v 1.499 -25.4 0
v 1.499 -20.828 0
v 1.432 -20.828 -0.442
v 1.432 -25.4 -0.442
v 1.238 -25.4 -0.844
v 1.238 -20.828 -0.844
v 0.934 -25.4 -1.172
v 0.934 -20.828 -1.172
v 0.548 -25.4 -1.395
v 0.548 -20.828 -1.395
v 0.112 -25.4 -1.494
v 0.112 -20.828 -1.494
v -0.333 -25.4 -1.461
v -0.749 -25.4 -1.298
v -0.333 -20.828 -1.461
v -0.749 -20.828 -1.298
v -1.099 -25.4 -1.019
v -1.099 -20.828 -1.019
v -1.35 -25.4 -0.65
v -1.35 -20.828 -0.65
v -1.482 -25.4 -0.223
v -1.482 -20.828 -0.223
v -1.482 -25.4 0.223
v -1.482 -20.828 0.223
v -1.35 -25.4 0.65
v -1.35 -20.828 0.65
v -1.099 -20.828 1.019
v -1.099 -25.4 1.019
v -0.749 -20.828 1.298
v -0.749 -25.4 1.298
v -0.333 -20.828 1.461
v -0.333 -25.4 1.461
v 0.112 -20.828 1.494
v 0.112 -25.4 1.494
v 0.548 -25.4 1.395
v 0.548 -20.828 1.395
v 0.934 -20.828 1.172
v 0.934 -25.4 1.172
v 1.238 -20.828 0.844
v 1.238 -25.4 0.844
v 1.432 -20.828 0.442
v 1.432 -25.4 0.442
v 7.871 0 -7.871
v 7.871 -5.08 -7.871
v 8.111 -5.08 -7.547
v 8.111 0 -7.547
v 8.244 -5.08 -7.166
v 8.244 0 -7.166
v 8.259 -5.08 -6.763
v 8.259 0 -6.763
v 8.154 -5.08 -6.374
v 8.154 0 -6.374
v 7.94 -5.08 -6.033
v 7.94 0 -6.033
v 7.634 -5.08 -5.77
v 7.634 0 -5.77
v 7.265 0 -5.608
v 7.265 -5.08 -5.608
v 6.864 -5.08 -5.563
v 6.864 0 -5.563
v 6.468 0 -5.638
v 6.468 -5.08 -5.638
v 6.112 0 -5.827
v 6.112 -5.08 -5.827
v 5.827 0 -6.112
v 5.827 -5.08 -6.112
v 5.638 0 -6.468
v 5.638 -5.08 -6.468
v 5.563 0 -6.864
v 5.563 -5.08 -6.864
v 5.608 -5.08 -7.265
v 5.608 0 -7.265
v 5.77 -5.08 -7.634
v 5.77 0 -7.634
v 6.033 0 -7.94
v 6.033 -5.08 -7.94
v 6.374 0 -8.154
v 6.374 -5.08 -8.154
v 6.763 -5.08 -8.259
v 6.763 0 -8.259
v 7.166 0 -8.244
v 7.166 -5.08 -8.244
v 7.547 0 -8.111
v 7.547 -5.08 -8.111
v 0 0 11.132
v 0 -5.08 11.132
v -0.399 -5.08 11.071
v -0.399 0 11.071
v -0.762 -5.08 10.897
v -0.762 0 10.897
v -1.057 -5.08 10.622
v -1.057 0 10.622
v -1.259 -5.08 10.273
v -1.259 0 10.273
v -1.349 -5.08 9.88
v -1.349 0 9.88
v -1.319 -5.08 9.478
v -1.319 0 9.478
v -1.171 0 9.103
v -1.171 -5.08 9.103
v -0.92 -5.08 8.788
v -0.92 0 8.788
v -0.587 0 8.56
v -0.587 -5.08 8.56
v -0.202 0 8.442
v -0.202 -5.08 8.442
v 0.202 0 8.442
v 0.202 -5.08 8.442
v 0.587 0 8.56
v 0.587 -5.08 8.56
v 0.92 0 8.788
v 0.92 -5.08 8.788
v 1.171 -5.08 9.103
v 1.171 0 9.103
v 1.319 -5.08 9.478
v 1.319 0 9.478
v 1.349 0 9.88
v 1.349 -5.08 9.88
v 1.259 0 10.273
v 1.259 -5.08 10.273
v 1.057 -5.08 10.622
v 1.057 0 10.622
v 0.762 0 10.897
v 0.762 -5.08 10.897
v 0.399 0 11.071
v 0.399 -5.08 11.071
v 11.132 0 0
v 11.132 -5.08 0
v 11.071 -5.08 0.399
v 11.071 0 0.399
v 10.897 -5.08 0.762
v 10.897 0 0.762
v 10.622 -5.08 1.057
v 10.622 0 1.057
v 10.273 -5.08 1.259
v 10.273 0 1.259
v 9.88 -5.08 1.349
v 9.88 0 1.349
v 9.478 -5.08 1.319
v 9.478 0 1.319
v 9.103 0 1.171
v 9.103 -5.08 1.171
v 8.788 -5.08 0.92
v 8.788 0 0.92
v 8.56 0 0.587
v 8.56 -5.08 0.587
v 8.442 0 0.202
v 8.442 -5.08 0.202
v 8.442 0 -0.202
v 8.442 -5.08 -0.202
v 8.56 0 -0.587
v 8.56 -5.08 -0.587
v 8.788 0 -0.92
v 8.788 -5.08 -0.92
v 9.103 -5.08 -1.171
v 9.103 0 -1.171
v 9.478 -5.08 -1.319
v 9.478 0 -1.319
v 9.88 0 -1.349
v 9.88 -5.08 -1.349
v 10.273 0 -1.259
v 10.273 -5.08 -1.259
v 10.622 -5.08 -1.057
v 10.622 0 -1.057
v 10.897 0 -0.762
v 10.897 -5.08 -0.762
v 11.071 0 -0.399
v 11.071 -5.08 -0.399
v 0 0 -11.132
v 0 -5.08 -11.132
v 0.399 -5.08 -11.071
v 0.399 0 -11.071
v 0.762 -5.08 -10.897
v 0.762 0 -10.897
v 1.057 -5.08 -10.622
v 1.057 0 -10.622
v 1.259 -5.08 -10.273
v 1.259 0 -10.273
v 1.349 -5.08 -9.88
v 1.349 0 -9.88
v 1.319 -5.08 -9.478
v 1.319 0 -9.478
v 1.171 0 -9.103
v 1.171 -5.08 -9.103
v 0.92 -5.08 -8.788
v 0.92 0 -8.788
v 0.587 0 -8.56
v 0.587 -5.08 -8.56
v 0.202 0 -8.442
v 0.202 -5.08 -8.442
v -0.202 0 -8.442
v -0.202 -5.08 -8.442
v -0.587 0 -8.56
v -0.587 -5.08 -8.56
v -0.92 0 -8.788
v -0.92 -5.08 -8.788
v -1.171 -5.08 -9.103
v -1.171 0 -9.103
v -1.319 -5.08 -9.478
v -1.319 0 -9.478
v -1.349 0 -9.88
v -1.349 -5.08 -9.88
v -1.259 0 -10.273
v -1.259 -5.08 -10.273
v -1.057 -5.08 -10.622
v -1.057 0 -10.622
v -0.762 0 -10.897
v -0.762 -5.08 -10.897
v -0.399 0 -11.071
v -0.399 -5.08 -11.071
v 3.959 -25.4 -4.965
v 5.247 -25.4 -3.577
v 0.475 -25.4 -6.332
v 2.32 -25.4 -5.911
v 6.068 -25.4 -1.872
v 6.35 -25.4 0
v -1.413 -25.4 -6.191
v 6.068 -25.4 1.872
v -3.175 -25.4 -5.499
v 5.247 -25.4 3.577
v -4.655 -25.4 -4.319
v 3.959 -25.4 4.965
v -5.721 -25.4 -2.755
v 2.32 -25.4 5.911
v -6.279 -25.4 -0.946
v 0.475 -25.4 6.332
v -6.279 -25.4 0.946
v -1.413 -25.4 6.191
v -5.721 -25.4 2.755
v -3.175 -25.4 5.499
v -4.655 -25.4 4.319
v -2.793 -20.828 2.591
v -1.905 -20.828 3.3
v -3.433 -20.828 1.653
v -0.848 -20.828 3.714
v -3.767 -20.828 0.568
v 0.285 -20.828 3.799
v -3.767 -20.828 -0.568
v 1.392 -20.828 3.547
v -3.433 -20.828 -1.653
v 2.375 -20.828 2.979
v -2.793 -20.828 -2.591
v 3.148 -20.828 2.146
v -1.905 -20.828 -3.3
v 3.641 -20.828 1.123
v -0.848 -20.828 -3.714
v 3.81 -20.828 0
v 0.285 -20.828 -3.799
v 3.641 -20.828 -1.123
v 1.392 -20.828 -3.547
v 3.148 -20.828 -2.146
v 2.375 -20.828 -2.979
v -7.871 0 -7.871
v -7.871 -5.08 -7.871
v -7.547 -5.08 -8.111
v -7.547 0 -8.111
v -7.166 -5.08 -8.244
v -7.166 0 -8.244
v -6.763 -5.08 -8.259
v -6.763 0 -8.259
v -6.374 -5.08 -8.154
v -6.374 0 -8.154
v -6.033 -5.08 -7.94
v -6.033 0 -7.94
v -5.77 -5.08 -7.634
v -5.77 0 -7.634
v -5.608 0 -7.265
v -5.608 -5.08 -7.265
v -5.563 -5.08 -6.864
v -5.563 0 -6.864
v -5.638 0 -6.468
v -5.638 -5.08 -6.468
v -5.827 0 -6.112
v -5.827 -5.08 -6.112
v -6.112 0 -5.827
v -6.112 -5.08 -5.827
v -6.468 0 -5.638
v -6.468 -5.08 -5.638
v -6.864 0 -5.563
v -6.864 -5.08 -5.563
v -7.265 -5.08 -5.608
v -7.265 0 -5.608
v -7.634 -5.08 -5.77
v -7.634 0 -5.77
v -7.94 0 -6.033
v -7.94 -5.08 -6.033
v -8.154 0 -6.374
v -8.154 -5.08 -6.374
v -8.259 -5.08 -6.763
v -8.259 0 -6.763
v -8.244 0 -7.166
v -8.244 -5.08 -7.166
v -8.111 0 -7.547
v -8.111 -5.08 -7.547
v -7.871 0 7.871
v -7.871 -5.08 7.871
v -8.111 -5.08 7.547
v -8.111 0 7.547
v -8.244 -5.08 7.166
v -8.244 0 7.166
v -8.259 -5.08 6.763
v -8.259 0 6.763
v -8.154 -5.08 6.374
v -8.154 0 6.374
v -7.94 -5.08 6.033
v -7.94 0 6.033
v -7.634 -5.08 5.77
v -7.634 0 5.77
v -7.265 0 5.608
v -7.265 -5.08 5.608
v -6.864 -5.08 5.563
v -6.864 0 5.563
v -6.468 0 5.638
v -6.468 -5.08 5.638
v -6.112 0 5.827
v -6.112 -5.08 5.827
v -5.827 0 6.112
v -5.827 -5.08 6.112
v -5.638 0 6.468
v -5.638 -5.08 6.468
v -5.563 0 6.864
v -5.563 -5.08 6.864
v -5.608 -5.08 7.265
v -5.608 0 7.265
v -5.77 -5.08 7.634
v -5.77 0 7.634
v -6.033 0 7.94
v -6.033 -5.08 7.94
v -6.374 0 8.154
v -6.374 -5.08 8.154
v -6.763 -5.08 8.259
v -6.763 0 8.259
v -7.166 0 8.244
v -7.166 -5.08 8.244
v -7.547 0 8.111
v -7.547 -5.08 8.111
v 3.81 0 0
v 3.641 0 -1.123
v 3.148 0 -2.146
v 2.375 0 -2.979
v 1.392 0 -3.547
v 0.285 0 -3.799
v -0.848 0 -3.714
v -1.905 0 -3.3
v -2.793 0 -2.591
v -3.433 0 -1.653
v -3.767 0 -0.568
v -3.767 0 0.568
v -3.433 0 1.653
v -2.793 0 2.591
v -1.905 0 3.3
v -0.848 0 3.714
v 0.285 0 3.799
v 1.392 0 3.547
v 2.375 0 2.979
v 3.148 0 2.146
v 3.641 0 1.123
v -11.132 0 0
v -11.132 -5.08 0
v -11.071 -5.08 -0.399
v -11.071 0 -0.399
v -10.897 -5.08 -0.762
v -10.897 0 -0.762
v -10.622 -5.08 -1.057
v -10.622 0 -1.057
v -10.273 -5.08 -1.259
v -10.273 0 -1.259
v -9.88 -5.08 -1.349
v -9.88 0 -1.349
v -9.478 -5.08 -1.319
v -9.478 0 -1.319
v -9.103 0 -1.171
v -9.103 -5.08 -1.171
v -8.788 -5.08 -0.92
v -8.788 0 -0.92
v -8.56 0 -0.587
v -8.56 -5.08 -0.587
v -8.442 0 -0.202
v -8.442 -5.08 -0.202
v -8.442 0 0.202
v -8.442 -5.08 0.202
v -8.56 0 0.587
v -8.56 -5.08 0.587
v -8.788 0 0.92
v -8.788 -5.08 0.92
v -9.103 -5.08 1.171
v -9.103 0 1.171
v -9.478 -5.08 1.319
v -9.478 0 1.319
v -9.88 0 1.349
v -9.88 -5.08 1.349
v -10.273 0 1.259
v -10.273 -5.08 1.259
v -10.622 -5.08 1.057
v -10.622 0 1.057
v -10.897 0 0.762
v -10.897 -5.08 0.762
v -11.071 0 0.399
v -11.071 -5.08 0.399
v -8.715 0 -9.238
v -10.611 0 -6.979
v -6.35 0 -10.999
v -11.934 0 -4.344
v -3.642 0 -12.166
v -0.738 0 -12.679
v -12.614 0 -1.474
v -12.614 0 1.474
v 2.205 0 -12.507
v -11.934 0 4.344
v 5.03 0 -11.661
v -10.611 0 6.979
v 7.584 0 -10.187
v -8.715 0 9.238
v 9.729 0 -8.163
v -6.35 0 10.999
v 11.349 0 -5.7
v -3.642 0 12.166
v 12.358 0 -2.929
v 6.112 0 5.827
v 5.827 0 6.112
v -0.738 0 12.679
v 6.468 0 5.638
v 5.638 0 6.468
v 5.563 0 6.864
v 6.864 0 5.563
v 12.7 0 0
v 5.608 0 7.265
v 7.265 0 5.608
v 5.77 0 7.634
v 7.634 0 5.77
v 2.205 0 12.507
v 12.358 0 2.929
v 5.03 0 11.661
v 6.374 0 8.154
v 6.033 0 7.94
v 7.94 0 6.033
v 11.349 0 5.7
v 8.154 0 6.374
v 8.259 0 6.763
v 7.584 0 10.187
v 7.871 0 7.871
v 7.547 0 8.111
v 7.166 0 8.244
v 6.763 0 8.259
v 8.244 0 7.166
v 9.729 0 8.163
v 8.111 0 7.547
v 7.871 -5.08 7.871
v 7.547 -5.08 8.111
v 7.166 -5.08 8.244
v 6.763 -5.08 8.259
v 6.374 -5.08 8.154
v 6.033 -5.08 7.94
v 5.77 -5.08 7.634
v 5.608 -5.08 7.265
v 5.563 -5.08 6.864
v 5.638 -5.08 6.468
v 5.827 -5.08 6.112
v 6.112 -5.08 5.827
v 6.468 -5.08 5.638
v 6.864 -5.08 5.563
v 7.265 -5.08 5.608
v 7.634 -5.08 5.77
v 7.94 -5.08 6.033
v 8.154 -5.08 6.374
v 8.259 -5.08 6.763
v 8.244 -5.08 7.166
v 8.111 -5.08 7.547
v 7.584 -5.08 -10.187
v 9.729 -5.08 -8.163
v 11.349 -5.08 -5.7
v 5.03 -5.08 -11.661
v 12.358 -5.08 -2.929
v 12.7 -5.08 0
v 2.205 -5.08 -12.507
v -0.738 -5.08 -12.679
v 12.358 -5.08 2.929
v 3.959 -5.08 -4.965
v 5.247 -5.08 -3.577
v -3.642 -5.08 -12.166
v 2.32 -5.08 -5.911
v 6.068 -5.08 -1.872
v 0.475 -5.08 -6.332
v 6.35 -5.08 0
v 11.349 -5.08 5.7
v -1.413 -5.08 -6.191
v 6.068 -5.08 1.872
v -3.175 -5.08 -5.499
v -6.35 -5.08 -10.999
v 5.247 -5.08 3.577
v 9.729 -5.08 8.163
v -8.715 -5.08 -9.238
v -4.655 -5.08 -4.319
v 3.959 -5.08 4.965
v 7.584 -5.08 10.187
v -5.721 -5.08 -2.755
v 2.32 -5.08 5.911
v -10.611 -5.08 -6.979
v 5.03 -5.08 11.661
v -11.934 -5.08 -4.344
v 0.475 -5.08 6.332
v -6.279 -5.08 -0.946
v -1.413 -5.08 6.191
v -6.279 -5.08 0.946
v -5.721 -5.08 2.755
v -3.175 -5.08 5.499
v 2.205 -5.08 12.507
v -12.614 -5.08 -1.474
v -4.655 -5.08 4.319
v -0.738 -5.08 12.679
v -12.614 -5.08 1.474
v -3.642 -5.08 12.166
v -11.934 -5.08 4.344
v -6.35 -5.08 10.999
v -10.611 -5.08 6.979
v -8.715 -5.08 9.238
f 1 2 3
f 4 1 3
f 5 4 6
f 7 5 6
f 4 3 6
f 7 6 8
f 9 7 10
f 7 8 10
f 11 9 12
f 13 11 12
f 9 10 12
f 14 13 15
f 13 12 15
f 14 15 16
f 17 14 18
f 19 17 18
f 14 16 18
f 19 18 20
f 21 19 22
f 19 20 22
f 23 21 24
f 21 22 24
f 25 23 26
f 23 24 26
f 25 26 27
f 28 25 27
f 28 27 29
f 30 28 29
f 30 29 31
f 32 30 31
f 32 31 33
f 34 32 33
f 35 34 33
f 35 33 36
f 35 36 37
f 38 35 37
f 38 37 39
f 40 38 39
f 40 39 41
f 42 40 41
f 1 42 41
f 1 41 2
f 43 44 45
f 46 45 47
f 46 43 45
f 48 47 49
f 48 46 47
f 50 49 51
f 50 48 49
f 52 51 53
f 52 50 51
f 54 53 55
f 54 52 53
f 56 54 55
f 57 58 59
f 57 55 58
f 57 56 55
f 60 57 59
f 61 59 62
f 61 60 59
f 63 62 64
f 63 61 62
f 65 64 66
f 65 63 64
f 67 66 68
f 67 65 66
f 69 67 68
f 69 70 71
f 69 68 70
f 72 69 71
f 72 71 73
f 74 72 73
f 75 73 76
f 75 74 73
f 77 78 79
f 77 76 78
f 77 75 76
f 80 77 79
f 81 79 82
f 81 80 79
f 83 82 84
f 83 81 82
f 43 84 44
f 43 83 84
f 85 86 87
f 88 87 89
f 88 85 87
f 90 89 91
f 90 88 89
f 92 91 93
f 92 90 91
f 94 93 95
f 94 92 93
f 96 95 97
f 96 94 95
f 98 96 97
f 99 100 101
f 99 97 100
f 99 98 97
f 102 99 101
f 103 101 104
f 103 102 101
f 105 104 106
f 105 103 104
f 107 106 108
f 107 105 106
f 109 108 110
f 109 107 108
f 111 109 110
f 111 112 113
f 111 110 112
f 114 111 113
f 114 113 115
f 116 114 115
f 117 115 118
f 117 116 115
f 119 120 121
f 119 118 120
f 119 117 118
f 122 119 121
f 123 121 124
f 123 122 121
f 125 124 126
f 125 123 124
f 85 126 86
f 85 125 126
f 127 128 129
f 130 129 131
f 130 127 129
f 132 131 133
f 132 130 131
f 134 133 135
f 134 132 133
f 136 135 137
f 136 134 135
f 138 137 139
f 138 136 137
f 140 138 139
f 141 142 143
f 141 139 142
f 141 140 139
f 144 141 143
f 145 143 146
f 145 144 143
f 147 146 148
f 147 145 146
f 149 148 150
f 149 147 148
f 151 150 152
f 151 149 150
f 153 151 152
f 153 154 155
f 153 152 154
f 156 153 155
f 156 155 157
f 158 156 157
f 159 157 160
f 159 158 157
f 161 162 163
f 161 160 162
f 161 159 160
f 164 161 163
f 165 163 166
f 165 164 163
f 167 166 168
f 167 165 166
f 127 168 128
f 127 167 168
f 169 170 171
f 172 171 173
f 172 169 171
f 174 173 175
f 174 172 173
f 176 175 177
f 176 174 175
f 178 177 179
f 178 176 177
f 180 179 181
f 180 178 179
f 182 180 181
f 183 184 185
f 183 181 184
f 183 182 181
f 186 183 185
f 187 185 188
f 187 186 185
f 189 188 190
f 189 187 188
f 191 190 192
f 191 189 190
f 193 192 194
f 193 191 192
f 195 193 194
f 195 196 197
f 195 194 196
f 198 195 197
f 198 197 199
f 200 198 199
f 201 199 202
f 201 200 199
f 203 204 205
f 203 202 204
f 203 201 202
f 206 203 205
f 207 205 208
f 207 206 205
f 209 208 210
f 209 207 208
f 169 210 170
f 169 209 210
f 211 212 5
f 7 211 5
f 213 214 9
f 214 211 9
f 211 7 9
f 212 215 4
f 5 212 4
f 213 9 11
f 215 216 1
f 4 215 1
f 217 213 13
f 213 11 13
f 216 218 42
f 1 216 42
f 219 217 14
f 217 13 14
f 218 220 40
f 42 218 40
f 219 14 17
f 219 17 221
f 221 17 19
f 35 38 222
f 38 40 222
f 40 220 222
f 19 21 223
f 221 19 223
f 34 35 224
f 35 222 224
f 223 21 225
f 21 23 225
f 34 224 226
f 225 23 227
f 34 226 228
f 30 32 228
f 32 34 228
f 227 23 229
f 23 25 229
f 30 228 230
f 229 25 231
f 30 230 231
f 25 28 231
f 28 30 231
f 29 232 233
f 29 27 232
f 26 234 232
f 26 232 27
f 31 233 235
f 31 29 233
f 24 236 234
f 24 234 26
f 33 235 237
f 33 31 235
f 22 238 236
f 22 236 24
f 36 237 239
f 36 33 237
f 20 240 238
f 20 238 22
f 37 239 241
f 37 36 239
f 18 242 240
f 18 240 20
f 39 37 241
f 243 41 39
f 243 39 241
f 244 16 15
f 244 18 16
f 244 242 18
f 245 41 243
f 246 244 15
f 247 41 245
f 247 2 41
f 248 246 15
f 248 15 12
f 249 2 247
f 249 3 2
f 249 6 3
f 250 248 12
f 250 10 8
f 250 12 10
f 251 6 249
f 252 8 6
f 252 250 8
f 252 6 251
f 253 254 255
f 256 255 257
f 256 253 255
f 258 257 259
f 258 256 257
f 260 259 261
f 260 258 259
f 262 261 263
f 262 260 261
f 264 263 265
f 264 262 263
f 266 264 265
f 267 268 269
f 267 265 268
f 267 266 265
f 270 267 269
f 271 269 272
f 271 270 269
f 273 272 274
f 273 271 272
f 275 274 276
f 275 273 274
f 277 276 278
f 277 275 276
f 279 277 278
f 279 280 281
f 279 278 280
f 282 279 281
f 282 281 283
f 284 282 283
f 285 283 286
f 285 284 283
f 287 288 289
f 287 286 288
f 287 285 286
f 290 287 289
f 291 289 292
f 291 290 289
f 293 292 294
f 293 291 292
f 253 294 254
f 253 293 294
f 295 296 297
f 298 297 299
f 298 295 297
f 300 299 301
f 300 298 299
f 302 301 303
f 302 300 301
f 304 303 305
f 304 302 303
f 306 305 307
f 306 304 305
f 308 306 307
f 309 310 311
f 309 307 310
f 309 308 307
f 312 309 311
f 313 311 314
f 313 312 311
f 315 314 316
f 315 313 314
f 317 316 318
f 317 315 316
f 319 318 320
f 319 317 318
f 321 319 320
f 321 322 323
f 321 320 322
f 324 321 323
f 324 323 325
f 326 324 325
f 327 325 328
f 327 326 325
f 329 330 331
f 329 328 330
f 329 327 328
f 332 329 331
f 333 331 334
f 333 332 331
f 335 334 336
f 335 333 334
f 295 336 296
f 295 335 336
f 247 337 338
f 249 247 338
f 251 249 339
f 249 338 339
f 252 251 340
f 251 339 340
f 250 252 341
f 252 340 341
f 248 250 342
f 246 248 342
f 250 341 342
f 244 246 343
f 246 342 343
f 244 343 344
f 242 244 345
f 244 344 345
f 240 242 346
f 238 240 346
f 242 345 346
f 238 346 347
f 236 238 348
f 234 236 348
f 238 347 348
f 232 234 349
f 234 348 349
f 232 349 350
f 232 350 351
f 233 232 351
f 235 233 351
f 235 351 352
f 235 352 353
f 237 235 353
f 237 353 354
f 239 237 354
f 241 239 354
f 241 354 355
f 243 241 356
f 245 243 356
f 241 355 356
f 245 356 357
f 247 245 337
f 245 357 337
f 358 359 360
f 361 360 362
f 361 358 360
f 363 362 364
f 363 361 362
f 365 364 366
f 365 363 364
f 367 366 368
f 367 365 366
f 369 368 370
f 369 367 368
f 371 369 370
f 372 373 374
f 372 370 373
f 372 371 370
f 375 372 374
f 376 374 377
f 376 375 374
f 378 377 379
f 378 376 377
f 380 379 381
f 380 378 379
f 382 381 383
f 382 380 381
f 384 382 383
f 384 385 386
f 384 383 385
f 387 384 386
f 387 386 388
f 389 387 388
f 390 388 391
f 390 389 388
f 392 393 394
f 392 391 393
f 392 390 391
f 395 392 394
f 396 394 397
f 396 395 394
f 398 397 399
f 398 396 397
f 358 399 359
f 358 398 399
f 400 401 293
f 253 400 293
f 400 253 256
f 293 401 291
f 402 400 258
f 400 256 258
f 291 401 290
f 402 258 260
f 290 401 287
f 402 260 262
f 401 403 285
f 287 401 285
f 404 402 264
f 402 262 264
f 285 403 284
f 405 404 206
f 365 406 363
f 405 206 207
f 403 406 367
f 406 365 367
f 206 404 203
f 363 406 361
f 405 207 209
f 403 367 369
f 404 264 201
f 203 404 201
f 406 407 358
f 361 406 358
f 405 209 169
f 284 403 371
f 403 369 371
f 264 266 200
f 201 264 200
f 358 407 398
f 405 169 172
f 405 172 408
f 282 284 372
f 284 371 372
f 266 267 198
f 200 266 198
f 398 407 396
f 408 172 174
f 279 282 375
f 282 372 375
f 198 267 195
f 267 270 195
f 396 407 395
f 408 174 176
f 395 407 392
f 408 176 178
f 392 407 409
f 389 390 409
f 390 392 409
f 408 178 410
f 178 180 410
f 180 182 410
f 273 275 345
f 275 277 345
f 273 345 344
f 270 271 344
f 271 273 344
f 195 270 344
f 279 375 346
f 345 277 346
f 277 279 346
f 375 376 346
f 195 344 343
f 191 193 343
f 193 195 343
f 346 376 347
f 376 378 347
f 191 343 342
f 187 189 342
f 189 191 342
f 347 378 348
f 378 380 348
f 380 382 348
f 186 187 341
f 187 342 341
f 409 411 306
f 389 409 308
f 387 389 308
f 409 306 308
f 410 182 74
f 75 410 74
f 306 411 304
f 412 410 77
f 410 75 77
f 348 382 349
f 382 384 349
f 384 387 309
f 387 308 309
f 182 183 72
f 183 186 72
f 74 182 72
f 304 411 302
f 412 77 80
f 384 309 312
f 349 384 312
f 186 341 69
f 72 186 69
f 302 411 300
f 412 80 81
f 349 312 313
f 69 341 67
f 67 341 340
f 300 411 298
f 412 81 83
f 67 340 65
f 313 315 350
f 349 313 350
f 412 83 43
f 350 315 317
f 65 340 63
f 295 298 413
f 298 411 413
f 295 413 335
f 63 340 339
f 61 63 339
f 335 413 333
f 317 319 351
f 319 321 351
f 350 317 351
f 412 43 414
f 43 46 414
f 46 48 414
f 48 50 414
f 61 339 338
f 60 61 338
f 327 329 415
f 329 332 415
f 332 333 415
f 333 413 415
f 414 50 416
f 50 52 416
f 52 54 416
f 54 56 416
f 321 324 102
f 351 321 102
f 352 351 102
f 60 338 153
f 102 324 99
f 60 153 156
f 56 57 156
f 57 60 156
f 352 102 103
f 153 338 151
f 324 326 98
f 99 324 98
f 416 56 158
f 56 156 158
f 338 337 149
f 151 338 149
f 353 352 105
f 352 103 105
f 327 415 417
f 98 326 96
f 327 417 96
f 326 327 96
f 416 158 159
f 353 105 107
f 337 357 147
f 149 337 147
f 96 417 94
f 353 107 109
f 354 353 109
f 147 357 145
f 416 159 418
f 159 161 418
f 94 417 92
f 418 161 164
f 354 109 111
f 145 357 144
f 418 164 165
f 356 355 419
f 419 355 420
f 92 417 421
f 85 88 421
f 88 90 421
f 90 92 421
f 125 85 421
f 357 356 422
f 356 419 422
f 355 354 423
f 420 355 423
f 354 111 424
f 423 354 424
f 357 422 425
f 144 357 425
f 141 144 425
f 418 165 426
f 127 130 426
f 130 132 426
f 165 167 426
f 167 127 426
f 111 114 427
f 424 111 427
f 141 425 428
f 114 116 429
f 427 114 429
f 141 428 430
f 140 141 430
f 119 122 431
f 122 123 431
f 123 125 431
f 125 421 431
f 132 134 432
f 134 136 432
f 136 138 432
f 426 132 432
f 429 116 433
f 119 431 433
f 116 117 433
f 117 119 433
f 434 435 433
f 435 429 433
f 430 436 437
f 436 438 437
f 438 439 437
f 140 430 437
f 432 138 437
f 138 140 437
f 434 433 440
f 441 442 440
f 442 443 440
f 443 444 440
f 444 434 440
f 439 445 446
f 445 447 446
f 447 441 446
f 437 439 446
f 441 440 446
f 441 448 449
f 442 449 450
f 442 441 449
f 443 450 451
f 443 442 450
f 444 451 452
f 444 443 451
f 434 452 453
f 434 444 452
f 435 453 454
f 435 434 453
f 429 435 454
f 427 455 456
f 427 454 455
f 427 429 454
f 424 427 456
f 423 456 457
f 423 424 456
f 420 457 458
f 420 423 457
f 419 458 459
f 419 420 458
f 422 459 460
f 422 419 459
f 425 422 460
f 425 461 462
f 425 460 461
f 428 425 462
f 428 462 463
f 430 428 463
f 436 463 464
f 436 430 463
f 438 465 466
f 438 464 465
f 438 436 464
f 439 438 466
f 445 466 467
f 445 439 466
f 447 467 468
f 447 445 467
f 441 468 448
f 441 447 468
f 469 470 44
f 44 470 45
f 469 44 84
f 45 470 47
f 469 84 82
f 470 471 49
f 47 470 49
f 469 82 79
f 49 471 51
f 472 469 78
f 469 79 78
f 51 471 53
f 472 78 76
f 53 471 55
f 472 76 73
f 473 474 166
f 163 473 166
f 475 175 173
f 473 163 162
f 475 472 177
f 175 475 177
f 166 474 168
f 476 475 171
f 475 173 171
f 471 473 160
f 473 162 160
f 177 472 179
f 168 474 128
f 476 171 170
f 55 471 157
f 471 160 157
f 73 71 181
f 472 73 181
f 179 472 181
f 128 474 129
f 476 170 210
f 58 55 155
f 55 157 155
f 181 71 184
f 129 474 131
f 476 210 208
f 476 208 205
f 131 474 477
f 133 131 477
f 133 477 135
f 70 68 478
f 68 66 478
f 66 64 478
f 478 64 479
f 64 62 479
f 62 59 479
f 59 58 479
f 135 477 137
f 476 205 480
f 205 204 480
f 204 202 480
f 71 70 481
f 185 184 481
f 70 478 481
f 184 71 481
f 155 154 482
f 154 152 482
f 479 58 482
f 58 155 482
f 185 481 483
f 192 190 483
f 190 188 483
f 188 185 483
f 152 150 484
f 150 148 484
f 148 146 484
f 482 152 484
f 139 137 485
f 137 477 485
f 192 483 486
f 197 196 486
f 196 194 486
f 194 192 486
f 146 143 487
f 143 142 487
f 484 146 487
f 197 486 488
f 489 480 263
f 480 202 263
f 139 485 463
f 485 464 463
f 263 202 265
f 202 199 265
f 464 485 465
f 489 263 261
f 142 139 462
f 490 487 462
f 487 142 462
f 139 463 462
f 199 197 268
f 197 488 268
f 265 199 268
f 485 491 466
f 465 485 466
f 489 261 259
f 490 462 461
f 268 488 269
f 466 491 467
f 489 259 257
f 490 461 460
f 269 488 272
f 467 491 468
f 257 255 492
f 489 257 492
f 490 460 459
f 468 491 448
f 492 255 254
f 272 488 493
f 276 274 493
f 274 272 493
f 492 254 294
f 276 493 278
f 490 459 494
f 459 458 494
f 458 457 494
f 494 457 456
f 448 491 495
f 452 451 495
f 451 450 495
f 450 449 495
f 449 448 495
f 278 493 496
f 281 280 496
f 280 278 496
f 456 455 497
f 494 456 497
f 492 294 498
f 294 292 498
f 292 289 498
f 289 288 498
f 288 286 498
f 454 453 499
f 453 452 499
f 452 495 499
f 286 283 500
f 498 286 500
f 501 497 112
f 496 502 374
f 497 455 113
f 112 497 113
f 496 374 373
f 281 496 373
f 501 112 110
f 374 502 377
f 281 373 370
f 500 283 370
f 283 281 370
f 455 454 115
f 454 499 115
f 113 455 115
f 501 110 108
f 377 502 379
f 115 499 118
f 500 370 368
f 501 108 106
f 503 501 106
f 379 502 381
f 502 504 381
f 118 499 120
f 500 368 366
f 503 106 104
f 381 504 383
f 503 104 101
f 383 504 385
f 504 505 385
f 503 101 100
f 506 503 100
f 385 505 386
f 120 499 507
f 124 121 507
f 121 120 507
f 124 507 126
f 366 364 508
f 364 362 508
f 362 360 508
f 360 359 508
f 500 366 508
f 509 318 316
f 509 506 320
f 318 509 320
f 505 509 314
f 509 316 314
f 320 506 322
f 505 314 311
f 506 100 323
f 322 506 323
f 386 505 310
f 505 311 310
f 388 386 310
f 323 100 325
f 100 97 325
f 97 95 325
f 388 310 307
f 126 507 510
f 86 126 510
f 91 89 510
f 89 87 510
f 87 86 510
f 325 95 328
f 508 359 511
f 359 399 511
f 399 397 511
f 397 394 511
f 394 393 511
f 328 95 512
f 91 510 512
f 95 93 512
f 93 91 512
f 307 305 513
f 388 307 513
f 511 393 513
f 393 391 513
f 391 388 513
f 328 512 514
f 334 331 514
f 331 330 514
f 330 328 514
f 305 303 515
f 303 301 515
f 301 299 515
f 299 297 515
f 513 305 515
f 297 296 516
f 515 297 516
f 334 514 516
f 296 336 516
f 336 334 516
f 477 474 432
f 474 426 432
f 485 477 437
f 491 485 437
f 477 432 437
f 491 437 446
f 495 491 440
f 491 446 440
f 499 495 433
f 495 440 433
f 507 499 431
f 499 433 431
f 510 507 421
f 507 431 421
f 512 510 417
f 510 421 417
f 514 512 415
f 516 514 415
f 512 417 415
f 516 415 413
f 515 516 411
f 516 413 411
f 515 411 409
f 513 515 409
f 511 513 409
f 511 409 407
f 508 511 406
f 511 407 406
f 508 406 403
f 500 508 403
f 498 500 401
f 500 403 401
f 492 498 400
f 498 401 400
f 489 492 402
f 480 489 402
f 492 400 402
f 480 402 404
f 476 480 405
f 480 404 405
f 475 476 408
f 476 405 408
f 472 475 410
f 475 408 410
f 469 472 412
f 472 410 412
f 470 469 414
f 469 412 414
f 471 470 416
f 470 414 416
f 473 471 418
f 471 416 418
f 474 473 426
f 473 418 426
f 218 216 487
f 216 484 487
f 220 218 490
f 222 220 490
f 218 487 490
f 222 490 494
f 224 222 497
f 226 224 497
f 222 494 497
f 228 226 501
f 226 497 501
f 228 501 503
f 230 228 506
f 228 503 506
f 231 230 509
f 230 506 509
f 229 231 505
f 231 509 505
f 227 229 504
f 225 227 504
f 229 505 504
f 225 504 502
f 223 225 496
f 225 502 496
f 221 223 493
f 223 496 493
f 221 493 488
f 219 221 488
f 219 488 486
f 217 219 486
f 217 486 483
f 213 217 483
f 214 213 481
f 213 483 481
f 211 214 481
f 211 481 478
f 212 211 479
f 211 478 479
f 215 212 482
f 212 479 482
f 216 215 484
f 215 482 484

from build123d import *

# Parameters (mm, degrees)
CIRPATTERN1_COUNT  = 8
SKETCH5_R          = 3.81
CUT_EXTRUDE1_DEPTH = 20.828
SKETCH6_R          = 1.4986
CUT_EXTRUDE2_DEPTH = 5.572


with BuildPart() as part:
    # Sketch1 → Revolve1 (revolve)
    with BuildSketch(Plane.XY):
        Polygon((12.7, 0), (0, 0), (0, -25.4), (6.35, -25.4), (6.35, -5.08), (12.7, -5.08), align=None)
    revolve(axis=Axis((0, 0, 0), (0, -1, 0)))

    # Sketch4 → #6-32 Tapped Hole1 (revolve, cut)
    with BuildSketch(Plane(origin=(0, 0, 9.779), x_dir=(0, 0, 1), z_dir=(1, 0, 0))):
        Polygon((0, 0), (0, 10.21069403), (1.35255, 9.398), (1.35255, 0), align=None)
    f_6_32_tapped_hole1 = revolve(axis=Axis((0, 6.35, 9.779), (0, -1, 0)), mode=Mode.SUBTRACT)

    # CirPattern1: #6-32 Tapped Hole1 ×8 about axis
    cirpattern1_axis = Axis((0, 0, 0), (0, 1, 0))
    for i in range(1, CIRPATTERN1_COUNT):
        add(f_6_32_tapped_hole1.rotate(cirpattern1_axis, i * 360 / CIRPATTERN1_COUNT), mode=Mode.SUBTRACT)

    # Sketch5 → Cut-Extrude1 (cut)
    with BuildSketch(Plane(origin=(0, 0, 0), x_dir=(1, 0, 0), z_dir=(0, 1, 0))):
        Circle(SKETCH5_R)
    extrude(amount=-CUT_EXTRUDE1_DEPTH, mode=Mode.SUBTRACT)

    # Sketch6 → Cut-Extrude2 (cut, through all)
    with BuildSketch(Plane(origin=(0, -20.828, 0), x_dir=(1, 0, 0), z_dir=(0, 1, 0))):
        Circle(SKETCH6_R)
    extrude(amount=-CUT_EXTRUDE2_DEPTH, mode=Mode.SUBTRACT)


solid = part.part
